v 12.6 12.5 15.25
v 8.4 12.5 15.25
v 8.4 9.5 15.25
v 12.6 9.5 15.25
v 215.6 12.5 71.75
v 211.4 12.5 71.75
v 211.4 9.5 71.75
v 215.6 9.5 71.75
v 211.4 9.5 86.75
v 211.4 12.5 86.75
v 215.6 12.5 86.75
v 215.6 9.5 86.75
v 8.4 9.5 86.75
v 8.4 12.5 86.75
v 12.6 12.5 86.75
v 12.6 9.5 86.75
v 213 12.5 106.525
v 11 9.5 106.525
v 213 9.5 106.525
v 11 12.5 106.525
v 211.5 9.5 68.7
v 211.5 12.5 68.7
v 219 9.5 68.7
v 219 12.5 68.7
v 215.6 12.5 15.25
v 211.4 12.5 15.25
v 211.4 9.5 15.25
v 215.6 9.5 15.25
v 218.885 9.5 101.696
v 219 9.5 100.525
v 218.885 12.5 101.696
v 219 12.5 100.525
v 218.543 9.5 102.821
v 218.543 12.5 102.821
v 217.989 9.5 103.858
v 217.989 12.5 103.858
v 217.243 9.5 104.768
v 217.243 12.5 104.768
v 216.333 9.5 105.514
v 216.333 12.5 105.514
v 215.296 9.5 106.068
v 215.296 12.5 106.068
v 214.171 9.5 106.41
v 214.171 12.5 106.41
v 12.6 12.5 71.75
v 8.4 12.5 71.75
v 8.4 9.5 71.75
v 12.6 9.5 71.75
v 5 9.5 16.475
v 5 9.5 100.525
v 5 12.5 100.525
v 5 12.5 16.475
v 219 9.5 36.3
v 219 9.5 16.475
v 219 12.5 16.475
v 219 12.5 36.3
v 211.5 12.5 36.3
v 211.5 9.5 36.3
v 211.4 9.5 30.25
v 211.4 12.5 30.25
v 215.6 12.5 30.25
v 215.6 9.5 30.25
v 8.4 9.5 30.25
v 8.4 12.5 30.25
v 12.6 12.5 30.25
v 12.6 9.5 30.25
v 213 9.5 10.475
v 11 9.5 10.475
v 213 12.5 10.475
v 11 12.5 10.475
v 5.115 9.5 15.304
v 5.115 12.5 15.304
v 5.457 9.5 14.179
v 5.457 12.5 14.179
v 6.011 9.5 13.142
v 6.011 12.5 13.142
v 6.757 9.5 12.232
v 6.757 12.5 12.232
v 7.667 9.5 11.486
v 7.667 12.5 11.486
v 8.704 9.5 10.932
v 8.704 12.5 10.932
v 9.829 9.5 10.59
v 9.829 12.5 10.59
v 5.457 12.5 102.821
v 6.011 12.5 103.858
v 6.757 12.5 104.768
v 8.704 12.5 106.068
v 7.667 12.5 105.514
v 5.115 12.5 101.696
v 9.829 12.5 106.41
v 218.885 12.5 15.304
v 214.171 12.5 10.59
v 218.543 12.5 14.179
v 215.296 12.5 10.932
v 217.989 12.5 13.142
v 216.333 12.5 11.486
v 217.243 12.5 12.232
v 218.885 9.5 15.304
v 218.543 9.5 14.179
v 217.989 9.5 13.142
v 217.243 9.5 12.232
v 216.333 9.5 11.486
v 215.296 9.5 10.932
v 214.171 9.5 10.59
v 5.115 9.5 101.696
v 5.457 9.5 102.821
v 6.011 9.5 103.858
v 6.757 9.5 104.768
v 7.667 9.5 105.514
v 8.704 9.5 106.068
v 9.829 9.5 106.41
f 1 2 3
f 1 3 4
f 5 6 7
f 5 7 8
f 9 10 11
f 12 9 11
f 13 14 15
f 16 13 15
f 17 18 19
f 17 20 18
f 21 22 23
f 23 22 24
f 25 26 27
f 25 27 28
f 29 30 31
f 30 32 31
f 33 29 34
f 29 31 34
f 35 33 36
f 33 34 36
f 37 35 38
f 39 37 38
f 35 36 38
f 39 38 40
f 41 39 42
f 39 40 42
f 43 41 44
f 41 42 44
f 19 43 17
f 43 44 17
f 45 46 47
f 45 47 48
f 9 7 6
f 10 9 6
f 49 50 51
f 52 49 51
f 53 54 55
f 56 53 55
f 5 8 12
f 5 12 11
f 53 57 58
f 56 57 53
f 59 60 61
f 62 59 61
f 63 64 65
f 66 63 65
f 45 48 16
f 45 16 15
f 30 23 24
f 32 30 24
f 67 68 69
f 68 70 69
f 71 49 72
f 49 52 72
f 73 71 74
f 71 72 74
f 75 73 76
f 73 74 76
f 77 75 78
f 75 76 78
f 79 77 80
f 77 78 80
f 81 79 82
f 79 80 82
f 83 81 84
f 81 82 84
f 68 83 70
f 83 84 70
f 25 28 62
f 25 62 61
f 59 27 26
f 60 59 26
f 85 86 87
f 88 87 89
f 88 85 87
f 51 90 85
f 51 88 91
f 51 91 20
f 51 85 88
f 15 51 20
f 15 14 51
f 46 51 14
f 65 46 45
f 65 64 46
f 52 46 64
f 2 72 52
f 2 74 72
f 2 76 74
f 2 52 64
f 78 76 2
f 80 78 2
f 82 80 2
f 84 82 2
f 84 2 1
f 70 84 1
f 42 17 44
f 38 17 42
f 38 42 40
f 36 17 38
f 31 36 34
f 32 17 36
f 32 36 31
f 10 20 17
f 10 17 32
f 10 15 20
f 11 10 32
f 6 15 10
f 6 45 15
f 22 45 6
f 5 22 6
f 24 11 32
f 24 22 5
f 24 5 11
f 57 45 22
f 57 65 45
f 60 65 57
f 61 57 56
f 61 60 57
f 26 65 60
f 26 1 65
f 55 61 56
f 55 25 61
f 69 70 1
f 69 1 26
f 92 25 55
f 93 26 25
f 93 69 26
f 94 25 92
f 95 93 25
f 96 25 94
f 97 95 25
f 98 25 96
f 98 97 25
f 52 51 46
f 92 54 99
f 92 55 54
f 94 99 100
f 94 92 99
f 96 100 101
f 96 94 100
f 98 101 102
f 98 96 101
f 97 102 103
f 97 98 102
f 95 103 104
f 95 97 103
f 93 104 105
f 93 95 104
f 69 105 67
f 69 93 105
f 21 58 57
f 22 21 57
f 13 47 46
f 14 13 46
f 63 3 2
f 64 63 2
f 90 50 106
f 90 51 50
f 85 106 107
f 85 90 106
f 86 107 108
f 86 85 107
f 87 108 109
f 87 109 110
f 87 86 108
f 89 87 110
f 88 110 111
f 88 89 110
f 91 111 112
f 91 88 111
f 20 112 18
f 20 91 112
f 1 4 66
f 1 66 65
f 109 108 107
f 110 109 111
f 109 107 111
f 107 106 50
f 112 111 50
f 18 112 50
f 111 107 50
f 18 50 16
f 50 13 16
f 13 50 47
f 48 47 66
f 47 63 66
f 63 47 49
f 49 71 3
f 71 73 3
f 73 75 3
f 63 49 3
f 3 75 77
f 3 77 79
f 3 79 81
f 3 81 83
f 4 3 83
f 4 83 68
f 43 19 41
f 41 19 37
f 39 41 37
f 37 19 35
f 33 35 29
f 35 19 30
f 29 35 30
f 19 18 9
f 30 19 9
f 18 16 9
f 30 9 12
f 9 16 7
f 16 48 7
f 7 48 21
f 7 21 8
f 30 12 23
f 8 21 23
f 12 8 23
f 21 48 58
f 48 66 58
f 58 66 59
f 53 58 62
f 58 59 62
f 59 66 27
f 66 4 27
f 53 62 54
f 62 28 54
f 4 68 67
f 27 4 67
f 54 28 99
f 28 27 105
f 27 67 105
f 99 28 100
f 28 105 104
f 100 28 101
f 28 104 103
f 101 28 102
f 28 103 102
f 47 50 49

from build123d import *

# Parameters (mm, degrees)
BOX021_W     = 4.2
BOX021_H     = 6
BOX021_DEPTH = 15
BOX020_W     = 4.2
BOX020_H     = 6
BOX020_DEPTH = 15
BOX019_W     = 4.2
BOX019_H     = 6
BOX019_DEPTH = 15
BOX018_W     = 4.2
BOX018_H     = 6
BOX018_DEPTH = 15
BOX017_W     = 10
BOX017_H     = 10
BOX017_DEPTH = 32.4
BOX016_W     = 214
BOX016_H     = 3
BOX016_DEPTH = 96.05
FILLET001_R  = 6


with BuildPart() as brsupportopening:
    # Box021 → Box021 (new body)
    with BuildSketch(Plane(origin=(211.4, 8, 15.25), x_dir=(1, 0, 0), z_dir=(0, 0, 1))):
        with Locations((2.1, 3)):
            Rectangle(BOX021_W, BOX021_H)
    extrude(amount=BOX021_DEPTH)


with BuildPart() as blsupportopening:
    # Box020 → Box020 (new body)
    with BuildSketch(Plane(origin=(8.4, 8, 15.25), x_dir=(1, 0, 0), z_dir=(0, 0, 1))):
        with Locations((2.1, 3)):
            Rectangle(BOX020_W, BOX020_H)
    extrude(amount=BOX020_DEPTH)


with BuildPart() as tlsupportopening:
    # Box019 → Box019 (new body)
    with BuildSketch(Plane(origin=(8.4, 8, 71.75), x_dir=(1, 0, 0), z_dir=(0, 0, 1))):
        with Locations((2.1, 3)):
            Rectangle(BOX019_W, BOX019_H)
    extrude(amount=BOX019_DEPTH)


with BuildPart() as trsupportopening:
    # Box018 → Box018 (new body)
    with BuildSketch(Plane(origin=(211.4, 8, 71.75), x_dir=(1, 0, 0), z_dir=(0, 0, 1))):
        with Locations((2.1, 3)):
            Rectangle(BOX018_W, BOX018_H)
    extrude(amount=BOX018_DEPTH)


with BuildPart() as usbopening:
    # Box017 → Box017 (new body)
    with BuildSketch(Plane(origin=(211.5, 4.5, 36.3), x_dir=(1, 0, 0), z_dir=(0, 0, 1))):
        with Locations((5, 5)):
            Rectangle(BOX017_W, BOX017_H)
    extrude(amount=BOX017_DEPTH)


with BuildPart() as cut009:
    # Box016 → Box016 (new body)
    with BuildSketch(Plane(origin=(5, 9.5, 10.475), x_dir=(1, 0, 0), z_dir=(0, 0, 1))):
        with Locations((107, 1.5)):
            Rectangle(BOX016_W, BOX016_H)
    extrude(amount=BOX016_DEPTH)

    # Fillet001
    fillet001_edges = [cut009.edges().sort_by_distance(p)[0] for p in [
        (5, 11, 106.525),
        (5, 11, 10.475),
        (219, 11, 106.525),
        (219, 11, 10.475),
    ]]
    fillet(fillet001_edges, radius=FILLET001_R)

    # Cut005: cut USBOpening
    add(usbopening.part, mode=Mode.SUBTRACT)

    # Cut006: cut TRSupportOpening
    add(trsupportopening.part, mode=Mode.SUBTRACT)

    # Cut007: cut TLSupportOpening
    add(tlsupportopening.part, mode=Mode.SUBTRACT)

    # Cut008: cut BLSupportOpening
    add(blsupportopening.part, mode=Mode.SUBTRACT)

    # Cut009: cut BRSupportOpening
    add(brsupportopening.part, mode=Mode.SUBTRACT)


solid = cut009.part
